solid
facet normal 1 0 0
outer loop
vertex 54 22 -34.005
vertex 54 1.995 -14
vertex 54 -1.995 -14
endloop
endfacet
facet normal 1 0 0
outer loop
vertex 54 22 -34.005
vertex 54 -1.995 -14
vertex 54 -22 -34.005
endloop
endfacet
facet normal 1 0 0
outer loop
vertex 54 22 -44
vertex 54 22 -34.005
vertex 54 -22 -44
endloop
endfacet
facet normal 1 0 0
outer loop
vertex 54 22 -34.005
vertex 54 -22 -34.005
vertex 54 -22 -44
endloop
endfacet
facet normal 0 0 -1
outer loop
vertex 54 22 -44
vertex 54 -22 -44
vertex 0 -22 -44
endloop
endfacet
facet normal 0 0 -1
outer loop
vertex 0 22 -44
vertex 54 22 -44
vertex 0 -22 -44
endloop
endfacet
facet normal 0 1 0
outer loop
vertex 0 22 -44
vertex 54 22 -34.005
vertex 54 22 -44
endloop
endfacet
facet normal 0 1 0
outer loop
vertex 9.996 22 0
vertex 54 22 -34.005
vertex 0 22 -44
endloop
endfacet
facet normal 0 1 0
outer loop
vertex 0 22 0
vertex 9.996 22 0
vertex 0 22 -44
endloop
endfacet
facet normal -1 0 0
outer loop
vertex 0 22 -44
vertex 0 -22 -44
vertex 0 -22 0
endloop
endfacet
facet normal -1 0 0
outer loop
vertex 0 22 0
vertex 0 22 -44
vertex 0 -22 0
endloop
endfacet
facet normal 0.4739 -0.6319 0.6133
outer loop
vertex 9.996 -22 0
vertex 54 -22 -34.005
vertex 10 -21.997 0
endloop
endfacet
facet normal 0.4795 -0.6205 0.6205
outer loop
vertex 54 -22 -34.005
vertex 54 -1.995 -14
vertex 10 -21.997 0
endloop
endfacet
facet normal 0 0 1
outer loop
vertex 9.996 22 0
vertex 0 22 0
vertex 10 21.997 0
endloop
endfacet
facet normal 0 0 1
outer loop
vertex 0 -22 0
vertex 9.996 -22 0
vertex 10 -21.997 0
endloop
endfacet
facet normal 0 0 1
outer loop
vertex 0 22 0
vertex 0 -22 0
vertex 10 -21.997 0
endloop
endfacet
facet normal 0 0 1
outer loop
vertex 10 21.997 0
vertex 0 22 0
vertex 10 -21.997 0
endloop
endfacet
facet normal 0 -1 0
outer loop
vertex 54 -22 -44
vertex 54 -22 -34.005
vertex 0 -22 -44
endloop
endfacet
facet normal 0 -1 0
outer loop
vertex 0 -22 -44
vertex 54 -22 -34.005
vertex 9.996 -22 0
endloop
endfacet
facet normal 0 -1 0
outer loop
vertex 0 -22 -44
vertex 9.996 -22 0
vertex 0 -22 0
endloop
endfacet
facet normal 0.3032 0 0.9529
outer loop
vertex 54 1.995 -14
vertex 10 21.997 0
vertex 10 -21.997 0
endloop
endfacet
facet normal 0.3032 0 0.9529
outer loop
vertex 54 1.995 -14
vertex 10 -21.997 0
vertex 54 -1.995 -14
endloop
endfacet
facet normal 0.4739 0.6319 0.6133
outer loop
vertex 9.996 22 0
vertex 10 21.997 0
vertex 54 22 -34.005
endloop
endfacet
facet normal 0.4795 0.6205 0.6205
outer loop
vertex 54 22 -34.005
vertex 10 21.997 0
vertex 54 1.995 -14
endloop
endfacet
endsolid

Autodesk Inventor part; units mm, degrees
ref_plane "YZ Plane" through (0, 0, 0) normal (1, 0, 0) x (0, 1, 0)
ref_plane "XZ Plane" through (0, 0, 0) normal (0, 1, 0) x (-1, 0, 0)
sketch "草圖1" plane through (0, 0, 0) normal (0, 1, 0) x (-1, 0, 0)
  line L0 (0, 0) -> (-54, 0)
  line L1 (-54, 0) -> (-54, -44)
  line L2 (-54, -44) -> (0, -44)
  line L3 (0, -44) -> (0, 0)
  dimension "d0" = 54
  dimension "d1" = 44
extrude "擠出1" add sketch "草圖1" along normal mid plane 44
sketch "草圖2" plane through (0, 22, 0) normal (0, 1, 0) x (1, 0, 0)
  line L0 (0, 0) -> (54, 0) projected
  line L1 (10, 0) -> (54, 14)
  line L2 (54, 0) -> (54, 44) projected
  dimension "d4" = 10
  dimension "d5" = 30
extrude "擠出2" cut sketch "草圖2" against normal blind 60
sketch "草圖3" plane through (54, -22, -44) normal (1, 0, 0) x (0, 0, -1)
  line L0 (-30, 24) -> (-10, 44)
  line L1 (0, 44) -> (-44, 44) projected
  line L2 (-30, 44) -> (-30, 0) projected
  point P0 (-44, 22)
  point P1 (-30, 2)
  dimension "d8" = 20
  dimension "d9" = 20
ref_plane "工作平面1" through (10, 22, 0) normal (-0.4795, -0.6205, -0.6205) x (0.7913, 0, -0.6114)
sketch "草圖4" plane through (10, 22, 0) normal (-0.4795, -0.6205, -0.6205) x (0.7913, 0, -0.6114)
  line L0 (-15.1543, -12.3218) -> (93.717, -12.3218)
  line L1 (93.717, -12.3218) -> (93.717, 28.8166)
  line L2 (93.717, 28.8166) -> (-15.1543, 28.8166)
  line L3 (-15.1543, 28.8166) -> (-15.1543, -12.3218)
  point P0 (-7.9129, 13.4581)
extrude "擠出3" cut sketch "草圖4" against normal blind 40
mirror "鏡射1" about plane through (0, 0, 0) normal (0, 1, 0) of "擠出3"
properties part number "61"
